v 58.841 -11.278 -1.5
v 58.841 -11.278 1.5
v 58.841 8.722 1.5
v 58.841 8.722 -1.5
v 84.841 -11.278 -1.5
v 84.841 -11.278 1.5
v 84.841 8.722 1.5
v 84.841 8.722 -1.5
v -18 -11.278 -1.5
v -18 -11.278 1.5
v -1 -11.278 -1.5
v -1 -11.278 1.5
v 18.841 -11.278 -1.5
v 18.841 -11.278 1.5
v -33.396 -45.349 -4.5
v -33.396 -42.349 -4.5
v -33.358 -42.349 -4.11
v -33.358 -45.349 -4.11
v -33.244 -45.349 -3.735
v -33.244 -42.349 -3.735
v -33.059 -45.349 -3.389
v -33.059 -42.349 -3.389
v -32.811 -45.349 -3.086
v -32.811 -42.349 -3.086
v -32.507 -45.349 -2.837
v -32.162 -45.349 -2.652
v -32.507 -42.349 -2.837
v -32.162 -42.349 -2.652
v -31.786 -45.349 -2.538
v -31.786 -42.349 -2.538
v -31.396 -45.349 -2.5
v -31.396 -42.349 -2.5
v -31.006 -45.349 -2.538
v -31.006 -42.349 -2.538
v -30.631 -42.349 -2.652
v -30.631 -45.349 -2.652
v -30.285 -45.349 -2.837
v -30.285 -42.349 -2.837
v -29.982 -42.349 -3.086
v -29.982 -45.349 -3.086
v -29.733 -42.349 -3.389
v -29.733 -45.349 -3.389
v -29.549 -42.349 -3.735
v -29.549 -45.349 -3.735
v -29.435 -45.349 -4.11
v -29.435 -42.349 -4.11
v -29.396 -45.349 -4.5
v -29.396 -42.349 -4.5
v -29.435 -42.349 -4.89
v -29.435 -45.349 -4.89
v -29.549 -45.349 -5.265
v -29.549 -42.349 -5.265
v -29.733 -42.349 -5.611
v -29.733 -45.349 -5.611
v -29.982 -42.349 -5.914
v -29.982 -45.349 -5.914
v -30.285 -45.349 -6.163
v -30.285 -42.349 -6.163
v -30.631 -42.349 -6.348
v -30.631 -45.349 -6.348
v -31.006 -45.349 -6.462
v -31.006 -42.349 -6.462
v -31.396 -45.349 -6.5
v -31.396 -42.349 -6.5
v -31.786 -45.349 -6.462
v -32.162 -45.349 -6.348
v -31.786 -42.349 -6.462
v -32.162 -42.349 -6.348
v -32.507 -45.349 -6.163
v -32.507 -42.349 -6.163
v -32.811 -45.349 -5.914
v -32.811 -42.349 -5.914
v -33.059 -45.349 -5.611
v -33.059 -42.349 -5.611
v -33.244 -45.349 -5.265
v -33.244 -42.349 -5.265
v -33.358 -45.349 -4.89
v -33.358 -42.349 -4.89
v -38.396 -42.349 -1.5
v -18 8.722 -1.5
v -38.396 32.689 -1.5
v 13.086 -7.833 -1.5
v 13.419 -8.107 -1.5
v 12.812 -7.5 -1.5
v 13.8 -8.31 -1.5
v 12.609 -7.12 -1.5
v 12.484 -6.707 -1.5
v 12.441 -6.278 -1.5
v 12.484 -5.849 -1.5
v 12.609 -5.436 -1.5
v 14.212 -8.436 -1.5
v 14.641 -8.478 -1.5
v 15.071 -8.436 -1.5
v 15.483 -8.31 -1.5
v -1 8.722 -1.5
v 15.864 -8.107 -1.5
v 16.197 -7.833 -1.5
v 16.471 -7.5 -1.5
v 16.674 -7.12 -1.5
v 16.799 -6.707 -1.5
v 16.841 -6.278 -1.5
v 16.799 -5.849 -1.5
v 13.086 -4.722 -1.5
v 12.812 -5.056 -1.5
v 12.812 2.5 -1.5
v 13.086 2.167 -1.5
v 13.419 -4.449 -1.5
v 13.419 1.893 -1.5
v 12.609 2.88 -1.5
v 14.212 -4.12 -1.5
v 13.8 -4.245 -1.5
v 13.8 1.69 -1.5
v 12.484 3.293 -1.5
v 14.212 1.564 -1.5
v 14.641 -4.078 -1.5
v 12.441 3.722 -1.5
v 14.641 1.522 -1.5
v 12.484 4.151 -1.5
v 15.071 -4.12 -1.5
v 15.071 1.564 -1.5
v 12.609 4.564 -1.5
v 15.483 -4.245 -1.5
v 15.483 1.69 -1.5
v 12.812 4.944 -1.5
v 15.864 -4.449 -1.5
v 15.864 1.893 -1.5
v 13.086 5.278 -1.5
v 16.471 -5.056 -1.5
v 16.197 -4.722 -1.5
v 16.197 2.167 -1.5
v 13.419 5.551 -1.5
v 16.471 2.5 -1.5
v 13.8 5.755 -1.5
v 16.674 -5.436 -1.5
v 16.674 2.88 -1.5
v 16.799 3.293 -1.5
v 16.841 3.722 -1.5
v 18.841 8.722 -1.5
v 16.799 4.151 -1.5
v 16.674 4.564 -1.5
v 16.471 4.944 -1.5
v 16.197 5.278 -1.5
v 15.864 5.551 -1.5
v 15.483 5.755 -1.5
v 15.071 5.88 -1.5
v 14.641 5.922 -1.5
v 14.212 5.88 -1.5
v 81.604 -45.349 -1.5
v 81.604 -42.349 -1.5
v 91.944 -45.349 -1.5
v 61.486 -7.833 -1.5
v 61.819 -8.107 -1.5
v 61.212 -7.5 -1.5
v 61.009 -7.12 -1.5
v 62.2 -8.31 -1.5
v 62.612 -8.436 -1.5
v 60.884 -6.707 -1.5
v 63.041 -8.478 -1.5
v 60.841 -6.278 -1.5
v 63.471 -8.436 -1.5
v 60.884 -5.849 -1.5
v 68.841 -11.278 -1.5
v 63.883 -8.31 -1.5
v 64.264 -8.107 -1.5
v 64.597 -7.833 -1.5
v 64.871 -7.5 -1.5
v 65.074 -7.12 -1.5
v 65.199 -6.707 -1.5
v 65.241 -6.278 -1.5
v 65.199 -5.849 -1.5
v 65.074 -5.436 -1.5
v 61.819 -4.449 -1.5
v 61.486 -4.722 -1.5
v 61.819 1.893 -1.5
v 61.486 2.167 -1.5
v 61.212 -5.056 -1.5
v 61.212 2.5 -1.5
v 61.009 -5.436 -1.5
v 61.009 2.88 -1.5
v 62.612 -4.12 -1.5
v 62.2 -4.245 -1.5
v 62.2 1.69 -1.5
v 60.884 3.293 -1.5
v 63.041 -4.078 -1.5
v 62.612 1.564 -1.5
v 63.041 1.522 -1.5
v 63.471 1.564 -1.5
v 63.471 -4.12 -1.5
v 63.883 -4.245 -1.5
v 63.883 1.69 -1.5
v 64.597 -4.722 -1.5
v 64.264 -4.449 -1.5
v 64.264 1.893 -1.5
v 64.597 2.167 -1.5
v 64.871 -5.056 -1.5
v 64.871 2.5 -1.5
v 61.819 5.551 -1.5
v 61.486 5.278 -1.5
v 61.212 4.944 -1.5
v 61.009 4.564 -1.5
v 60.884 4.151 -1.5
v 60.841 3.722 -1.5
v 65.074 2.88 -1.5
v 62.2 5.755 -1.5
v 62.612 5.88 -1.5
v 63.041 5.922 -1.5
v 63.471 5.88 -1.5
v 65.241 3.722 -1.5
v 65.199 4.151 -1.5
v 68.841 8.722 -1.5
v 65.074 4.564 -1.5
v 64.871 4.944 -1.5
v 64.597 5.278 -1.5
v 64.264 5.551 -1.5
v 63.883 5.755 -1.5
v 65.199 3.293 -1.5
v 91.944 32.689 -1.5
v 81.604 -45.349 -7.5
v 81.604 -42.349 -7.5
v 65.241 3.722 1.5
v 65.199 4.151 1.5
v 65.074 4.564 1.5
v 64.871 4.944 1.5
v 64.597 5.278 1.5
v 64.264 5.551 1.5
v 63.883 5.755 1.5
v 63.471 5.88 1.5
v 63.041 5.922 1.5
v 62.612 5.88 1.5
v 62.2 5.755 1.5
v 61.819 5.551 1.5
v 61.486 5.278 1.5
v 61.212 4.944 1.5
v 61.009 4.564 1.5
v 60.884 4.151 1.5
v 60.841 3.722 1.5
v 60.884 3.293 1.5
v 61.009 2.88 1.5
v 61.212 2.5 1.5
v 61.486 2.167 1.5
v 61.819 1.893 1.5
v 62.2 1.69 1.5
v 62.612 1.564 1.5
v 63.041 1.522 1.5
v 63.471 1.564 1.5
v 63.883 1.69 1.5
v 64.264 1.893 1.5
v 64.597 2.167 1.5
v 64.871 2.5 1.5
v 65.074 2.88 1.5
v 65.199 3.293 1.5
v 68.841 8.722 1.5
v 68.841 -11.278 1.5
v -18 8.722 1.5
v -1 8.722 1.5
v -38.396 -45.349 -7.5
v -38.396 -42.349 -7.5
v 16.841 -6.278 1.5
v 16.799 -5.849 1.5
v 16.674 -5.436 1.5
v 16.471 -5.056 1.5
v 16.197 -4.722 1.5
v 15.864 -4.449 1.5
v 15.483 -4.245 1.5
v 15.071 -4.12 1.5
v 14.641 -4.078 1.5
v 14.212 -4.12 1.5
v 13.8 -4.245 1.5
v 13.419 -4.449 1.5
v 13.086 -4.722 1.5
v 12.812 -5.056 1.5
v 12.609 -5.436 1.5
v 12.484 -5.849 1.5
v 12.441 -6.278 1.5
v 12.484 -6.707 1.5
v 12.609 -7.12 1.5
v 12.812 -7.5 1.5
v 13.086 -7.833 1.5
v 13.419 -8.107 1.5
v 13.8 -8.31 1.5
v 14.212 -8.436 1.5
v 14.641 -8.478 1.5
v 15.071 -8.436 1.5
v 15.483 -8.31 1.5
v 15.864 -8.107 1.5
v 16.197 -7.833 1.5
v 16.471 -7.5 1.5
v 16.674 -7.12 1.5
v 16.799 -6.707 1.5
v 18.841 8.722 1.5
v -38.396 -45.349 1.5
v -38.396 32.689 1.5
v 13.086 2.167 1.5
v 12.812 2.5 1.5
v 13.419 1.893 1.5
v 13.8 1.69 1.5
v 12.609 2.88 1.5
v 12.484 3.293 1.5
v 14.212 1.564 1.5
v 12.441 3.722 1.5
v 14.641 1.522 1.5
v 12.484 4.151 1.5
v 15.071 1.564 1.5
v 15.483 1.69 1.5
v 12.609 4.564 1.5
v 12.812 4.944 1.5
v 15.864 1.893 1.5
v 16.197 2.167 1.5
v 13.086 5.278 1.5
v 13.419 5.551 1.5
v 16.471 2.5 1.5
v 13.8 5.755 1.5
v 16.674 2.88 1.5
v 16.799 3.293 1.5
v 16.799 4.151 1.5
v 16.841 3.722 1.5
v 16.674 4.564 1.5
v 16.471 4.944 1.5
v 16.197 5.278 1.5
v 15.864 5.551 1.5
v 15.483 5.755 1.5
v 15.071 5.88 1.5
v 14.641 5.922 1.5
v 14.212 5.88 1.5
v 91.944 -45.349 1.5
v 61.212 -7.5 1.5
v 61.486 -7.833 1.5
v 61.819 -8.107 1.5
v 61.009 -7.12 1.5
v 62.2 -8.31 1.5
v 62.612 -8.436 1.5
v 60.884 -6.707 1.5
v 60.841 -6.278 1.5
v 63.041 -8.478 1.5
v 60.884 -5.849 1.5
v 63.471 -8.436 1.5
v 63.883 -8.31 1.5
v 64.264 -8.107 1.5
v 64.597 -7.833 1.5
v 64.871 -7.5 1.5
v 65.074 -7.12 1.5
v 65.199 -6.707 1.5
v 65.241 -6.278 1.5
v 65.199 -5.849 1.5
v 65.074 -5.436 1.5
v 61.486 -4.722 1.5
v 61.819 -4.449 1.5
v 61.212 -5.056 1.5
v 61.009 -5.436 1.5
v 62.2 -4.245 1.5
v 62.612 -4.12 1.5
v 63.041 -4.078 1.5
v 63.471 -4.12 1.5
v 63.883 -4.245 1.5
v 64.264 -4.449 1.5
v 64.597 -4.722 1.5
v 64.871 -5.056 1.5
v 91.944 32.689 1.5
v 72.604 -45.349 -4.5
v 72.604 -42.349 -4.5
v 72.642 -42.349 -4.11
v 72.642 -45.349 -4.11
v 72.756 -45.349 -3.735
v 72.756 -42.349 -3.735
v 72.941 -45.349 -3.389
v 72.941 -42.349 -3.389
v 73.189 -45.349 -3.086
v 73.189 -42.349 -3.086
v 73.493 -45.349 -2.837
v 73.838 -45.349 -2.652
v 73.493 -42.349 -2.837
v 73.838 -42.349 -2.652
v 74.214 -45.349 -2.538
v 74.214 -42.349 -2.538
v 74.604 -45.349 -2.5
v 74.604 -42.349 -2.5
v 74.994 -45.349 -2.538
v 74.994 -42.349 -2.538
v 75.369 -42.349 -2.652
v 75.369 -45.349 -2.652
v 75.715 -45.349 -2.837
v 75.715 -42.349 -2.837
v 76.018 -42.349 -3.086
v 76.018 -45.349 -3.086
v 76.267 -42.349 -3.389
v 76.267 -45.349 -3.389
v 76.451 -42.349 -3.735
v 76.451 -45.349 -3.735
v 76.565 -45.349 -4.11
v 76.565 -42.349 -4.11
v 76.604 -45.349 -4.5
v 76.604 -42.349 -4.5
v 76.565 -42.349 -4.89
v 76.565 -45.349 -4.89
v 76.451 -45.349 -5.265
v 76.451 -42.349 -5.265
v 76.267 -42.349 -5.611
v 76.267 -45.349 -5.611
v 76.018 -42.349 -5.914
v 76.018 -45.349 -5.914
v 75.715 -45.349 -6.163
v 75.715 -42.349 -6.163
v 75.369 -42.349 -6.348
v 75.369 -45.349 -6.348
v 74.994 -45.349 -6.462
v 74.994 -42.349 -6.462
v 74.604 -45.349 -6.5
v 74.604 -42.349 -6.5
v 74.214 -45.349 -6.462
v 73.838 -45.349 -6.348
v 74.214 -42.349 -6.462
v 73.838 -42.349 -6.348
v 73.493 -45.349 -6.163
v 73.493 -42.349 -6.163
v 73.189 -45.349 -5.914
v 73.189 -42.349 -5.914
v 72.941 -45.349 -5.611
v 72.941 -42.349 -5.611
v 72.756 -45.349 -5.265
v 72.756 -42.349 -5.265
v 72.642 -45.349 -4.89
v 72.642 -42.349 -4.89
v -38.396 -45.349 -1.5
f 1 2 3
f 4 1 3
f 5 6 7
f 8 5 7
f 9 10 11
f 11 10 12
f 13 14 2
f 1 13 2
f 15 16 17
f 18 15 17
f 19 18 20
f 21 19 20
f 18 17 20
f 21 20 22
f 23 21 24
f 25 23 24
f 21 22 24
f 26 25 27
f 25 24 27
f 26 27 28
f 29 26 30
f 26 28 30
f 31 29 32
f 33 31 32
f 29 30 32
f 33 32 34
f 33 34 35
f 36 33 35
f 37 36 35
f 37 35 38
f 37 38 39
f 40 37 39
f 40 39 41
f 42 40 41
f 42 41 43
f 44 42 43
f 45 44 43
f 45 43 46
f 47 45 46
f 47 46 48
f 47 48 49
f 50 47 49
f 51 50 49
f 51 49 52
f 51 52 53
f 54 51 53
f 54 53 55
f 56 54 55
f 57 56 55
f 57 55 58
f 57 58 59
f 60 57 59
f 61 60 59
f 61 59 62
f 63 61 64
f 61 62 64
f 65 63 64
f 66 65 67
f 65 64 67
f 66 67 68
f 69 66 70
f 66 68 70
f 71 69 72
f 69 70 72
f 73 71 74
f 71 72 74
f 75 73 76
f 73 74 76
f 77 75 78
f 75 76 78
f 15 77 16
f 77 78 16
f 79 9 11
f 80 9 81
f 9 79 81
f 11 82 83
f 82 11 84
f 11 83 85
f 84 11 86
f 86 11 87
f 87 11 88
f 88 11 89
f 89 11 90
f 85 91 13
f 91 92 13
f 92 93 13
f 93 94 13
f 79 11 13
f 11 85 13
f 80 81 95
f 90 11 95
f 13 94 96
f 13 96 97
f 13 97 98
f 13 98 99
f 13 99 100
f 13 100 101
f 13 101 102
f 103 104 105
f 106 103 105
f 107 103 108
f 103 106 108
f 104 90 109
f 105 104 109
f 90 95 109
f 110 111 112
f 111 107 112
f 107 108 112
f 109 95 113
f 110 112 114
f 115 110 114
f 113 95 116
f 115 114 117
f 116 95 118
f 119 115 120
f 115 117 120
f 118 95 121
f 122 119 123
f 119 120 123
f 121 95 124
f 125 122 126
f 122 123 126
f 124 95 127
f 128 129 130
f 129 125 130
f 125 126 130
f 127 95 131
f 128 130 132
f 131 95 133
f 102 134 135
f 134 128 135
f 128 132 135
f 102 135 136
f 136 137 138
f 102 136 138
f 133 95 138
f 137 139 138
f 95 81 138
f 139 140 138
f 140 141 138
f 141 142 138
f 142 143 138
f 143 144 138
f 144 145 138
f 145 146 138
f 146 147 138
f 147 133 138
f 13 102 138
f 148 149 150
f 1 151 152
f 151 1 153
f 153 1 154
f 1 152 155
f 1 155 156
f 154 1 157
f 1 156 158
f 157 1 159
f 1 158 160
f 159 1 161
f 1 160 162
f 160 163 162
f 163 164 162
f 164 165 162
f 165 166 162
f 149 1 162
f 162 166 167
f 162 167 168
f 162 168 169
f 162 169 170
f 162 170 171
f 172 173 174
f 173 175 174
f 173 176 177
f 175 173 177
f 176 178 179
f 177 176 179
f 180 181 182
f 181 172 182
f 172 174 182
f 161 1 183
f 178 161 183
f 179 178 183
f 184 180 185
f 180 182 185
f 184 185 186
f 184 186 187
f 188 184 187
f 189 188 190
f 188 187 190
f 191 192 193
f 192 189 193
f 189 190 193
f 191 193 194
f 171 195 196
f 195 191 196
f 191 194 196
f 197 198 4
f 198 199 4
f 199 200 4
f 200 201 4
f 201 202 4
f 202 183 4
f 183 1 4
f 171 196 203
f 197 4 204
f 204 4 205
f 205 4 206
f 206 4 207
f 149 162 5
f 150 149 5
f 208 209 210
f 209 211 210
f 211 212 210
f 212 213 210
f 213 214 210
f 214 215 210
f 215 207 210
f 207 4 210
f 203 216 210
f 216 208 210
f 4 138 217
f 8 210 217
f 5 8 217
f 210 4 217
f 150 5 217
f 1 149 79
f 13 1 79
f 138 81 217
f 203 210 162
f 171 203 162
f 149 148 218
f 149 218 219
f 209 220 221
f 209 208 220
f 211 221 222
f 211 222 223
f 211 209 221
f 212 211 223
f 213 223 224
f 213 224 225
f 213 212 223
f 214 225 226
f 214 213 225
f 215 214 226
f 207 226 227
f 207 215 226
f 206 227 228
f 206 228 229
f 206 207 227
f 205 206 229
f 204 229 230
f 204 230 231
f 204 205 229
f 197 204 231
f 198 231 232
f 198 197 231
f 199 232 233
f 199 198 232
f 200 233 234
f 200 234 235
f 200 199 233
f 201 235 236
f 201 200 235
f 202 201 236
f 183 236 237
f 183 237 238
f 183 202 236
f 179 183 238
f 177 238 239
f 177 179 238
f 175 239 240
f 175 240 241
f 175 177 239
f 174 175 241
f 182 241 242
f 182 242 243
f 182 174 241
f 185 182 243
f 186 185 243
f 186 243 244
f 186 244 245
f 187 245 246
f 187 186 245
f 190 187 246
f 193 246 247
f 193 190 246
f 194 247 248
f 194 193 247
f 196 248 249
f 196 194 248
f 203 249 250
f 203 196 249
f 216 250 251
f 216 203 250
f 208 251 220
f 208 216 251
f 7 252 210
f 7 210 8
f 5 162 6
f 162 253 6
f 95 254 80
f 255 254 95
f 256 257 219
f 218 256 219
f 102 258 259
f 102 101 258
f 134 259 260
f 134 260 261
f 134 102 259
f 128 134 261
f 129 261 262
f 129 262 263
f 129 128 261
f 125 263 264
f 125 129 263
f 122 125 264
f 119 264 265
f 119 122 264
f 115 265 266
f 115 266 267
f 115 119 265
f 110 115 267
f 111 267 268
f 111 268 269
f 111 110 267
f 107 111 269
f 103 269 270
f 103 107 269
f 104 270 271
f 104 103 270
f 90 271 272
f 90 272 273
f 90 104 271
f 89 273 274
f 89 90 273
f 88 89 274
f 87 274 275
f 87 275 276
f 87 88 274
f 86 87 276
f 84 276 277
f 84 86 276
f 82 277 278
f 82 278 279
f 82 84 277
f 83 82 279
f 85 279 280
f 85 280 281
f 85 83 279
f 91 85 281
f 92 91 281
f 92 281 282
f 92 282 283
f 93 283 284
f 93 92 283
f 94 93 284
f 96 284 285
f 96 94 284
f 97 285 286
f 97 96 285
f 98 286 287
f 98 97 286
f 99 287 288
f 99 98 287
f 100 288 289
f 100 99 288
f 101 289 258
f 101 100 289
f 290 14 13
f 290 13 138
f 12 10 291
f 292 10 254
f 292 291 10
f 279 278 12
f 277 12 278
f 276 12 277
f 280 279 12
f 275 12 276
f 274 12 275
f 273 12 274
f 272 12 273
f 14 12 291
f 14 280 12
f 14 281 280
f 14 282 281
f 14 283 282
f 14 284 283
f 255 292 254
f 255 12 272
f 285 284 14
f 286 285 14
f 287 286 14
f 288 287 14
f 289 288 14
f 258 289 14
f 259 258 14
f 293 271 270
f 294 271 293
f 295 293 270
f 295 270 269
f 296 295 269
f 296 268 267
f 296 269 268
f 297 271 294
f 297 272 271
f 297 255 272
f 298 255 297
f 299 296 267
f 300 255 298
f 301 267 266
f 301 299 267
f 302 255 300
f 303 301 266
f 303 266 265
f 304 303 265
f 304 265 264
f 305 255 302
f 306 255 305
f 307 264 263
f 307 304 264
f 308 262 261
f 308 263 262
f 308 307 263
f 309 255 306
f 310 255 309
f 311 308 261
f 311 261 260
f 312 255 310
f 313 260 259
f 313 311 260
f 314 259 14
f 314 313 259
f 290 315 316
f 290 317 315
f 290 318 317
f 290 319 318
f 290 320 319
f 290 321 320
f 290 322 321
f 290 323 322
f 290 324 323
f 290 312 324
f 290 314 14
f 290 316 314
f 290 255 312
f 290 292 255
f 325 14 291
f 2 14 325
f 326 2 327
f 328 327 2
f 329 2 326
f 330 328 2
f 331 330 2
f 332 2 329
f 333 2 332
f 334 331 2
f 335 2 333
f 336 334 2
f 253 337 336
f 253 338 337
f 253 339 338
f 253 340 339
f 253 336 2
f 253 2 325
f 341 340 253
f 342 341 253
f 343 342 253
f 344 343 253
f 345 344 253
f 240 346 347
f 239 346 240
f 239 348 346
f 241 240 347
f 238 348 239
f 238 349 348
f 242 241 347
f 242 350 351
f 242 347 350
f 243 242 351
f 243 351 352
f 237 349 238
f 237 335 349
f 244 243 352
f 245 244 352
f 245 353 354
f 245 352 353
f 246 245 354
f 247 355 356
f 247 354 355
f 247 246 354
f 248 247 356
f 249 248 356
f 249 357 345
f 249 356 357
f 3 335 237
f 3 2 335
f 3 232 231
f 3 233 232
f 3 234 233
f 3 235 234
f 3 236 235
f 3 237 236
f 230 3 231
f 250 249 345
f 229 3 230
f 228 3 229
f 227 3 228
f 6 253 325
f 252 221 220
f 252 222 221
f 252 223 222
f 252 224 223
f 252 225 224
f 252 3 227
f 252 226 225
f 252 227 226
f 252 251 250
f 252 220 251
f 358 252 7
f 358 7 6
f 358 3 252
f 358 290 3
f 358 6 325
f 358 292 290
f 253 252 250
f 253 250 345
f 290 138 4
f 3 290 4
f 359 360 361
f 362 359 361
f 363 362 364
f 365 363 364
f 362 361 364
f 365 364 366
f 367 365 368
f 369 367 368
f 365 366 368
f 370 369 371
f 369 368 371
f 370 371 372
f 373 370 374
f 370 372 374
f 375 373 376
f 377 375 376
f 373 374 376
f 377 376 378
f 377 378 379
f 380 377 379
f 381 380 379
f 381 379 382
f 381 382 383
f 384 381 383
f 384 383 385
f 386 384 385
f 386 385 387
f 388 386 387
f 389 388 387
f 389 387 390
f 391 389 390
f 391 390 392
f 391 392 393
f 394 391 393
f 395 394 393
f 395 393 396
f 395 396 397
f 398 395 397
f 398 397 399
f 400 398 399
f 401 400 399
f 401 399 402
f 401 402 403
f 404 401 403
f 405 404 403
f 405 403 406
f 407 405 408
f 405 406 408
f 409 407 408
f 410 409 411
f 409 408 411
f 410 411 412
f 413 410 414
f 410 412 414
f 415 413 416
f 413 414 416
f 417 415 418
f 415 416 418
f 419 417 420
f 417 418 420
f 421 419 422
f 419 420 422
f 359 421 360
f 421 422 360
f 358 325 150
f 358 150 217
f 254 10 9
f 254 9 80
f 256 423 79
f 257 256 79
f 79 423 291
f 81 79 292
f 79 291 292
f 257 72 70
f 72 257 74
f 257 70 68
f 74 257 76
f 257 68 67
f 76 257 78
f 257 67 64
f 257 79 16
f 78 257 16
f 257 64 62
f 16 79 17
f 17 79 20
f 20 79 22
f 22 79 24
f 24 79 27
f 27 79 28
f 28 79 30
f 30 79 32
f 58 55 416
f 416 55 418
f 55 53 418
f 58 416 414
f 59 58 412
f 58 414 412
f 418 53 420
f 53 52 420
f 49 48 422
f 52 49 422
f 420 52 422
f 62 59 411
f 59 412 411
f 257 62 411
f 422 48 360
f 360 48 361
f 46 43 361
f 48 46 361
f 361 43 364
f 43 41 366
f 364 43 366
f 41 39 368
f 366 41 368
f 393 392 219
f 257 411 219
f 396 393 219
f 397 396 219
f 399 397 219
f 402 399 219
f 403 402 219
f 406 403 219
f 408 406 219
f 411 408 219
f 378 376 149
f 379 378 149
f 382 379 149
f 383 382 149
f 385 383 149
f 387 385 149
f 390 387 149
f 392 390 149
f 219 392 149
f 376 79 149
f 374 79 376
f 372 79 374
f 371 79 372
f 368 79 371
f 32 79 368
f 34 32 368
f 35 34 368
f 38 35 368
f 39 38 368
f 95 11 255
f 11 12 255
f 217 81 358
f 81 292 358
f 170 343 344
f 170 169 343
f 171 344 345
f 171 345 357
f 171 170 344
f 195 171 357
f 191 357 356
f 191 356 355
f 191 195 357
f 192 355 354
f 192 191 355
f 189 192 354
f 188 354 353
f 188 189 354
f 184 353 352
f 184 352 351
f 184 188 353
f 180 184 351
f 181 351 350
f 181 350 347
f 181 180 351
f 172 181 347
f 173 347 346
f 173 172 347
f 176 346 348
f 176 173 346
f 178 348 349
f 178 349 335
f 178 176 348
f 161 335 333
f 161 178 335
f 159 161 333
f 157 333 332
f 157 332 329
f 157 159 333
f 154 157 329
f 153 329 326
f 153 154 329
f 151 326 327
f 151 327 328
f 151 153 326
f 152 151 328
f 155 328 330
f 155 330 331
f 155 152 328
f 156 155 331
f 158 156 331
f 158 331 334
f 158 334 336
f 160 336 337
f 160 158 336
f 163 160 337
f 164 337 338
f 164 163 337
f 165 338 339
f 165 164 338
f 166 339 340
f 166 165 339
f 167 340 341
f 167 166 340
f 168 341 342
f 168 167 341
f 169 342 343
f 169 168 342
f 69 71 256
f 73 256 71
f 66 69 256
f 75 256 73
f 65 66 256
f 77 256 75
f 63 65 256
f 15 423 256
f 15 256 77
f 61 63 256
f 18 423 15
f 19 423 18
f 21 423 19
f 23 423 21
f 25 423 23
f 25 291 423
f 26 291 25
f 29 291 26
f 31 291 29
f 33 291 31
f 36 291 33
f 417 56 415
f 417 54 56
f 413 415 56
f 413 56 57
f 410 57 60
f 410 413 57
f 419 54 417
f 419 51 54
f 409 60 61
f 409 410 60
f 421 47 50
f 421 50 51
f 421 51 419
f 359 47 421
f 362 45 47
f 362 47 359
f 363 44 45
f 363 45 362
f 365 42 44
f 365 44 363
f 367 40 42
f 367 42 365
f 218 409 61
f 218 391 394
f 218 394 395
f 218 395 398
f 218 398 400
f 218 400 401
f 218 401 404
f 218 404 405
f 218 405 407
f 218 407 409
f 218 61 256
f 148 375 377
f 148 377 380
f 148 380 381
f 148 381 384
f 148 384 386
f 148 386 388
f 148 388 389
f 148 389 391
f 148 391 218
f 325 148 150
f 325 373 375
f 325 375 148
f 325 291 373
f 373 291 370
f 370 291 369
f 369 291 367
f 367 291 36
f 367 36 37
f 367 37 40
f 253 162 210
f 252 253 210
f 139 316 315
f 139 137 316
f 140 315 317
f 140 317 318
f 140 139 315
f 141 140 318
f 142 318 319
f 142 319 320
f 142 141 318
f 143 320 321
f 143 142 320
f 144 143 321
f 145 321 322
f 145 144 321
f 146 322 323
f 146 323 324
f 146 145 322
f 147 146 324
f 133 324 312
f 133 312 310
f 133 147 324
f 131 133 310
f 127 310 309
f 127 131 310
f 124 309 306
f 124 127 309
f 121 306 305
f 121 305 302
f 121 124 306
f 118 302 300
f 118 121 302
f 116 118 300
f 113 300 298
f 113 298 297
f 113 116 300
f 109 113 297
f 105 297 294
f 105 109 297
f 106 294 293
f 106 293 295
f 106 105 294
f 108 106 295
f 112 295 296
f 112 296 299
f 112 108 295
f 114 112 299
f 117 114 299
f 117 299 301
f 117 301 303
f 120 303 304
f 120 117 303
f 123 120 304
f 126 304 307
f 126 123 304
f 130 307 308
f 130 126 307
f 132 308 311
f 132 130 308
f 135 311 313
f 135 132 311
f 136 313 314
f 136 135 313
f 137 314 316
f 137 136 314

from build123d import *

# Parameters (mm, degrees)
SKETCH_1_W          = 130.339859815
SKETCH_1_H          = 78.03787785
SKETCH_1_R          = 2.2
SKETCH_1_W_2        = 40
SKETCH_1_H_2        = 20
SKETCH_1_W_3        = 17
SKETCH_1_H_3        = 20.000000003
SKETCH_1_W_4        = 16
EXTRUDE_1_DEPTH     = 1.5
SKETCH_2_W          = 120
SKETCH_2_H          = 3
EXTRUDE_2_DEPTH     = 9
SKETCH_3_R          = 2
CUT_EXTRUDE_1_DEPTH = 6


with BuildPart() as part:
    # 草图1 → 凸台-拉伸1 (new, symmetric)
    with BuildSketch(Plane.XY):
        with Locations((26.773633624, -6.330200198)):
            Rectangle(SKETCH_1_W, SKETCH_1_H)
        with Locations((14.641461985, 3.722155933)):
            Circle(SKETCH_1_R, mode=Mode.SUBTRACT)
        with Locations((14.641461985, -6.277844067)):
            Circle(SKETCH_1_R, mode=Mode.SUBTRACT)
        with Locations((63.041461985, 3.722155933)):
            Circle(SKETCH_1_R, mode=Mode.SUBTRACT)
        with Locations((63.041461985, -6.277844067)):
            Circle(SKETCH_1_R, mode=Mode.SUBTRACT)
        with Locations((38.841461985, -1.277844067)):
            Rectangle(SKETCH_1_W_2, SKETCH_1_H_2, mode=Mode.SUBTRACT)
        with Locations((-9.499534143, -1.277844069)):
            Rectangle(SKETCH_1_W_3, SKETCH_1_H_3, mode=Mode.SUBTRACT)
        with Locations((76.841461985, -1.277844067)):
            Rectangle(SKETCH_1_W_4, SKETCH_1_H_2, mode=Mode.SUBTRACT)
    extrude(amount=EXTRUDE_1_DEPTH, both=True)

    # 草图2 → 凸台-拉伸2 (add)
    with BuildSketch(Plane.XY.offset(1.5)):
        with Locations((21.603703717, -43.849139123)):
            Rectangle(SKETCH_2_W, SKETCH_2_H)
    extrude(amount=-EXTRUDE_2_DEPTH)

    # 草图3 → 切除-拉伸1 (cut)
    with BuildSketch(Plane(origin=(0, -42.349139123, 0), x_dir=(1, 0, 0), z_dir=(0, 1, 0))):
        with Locations(Location((-31.396296283, 4.5, 0), (0, 0, 180))):
            Circle(SKETCH_3_R)
        with Locations(Location((74.603703717, 4.5, 0), (0, 0, 180))):
            Circle(SKETCH_3_R)
    extrude(amount=-CUT_EXTRUDE_1_DEPTH, mode=Mode.SUBTRACT)


solid = part.part
